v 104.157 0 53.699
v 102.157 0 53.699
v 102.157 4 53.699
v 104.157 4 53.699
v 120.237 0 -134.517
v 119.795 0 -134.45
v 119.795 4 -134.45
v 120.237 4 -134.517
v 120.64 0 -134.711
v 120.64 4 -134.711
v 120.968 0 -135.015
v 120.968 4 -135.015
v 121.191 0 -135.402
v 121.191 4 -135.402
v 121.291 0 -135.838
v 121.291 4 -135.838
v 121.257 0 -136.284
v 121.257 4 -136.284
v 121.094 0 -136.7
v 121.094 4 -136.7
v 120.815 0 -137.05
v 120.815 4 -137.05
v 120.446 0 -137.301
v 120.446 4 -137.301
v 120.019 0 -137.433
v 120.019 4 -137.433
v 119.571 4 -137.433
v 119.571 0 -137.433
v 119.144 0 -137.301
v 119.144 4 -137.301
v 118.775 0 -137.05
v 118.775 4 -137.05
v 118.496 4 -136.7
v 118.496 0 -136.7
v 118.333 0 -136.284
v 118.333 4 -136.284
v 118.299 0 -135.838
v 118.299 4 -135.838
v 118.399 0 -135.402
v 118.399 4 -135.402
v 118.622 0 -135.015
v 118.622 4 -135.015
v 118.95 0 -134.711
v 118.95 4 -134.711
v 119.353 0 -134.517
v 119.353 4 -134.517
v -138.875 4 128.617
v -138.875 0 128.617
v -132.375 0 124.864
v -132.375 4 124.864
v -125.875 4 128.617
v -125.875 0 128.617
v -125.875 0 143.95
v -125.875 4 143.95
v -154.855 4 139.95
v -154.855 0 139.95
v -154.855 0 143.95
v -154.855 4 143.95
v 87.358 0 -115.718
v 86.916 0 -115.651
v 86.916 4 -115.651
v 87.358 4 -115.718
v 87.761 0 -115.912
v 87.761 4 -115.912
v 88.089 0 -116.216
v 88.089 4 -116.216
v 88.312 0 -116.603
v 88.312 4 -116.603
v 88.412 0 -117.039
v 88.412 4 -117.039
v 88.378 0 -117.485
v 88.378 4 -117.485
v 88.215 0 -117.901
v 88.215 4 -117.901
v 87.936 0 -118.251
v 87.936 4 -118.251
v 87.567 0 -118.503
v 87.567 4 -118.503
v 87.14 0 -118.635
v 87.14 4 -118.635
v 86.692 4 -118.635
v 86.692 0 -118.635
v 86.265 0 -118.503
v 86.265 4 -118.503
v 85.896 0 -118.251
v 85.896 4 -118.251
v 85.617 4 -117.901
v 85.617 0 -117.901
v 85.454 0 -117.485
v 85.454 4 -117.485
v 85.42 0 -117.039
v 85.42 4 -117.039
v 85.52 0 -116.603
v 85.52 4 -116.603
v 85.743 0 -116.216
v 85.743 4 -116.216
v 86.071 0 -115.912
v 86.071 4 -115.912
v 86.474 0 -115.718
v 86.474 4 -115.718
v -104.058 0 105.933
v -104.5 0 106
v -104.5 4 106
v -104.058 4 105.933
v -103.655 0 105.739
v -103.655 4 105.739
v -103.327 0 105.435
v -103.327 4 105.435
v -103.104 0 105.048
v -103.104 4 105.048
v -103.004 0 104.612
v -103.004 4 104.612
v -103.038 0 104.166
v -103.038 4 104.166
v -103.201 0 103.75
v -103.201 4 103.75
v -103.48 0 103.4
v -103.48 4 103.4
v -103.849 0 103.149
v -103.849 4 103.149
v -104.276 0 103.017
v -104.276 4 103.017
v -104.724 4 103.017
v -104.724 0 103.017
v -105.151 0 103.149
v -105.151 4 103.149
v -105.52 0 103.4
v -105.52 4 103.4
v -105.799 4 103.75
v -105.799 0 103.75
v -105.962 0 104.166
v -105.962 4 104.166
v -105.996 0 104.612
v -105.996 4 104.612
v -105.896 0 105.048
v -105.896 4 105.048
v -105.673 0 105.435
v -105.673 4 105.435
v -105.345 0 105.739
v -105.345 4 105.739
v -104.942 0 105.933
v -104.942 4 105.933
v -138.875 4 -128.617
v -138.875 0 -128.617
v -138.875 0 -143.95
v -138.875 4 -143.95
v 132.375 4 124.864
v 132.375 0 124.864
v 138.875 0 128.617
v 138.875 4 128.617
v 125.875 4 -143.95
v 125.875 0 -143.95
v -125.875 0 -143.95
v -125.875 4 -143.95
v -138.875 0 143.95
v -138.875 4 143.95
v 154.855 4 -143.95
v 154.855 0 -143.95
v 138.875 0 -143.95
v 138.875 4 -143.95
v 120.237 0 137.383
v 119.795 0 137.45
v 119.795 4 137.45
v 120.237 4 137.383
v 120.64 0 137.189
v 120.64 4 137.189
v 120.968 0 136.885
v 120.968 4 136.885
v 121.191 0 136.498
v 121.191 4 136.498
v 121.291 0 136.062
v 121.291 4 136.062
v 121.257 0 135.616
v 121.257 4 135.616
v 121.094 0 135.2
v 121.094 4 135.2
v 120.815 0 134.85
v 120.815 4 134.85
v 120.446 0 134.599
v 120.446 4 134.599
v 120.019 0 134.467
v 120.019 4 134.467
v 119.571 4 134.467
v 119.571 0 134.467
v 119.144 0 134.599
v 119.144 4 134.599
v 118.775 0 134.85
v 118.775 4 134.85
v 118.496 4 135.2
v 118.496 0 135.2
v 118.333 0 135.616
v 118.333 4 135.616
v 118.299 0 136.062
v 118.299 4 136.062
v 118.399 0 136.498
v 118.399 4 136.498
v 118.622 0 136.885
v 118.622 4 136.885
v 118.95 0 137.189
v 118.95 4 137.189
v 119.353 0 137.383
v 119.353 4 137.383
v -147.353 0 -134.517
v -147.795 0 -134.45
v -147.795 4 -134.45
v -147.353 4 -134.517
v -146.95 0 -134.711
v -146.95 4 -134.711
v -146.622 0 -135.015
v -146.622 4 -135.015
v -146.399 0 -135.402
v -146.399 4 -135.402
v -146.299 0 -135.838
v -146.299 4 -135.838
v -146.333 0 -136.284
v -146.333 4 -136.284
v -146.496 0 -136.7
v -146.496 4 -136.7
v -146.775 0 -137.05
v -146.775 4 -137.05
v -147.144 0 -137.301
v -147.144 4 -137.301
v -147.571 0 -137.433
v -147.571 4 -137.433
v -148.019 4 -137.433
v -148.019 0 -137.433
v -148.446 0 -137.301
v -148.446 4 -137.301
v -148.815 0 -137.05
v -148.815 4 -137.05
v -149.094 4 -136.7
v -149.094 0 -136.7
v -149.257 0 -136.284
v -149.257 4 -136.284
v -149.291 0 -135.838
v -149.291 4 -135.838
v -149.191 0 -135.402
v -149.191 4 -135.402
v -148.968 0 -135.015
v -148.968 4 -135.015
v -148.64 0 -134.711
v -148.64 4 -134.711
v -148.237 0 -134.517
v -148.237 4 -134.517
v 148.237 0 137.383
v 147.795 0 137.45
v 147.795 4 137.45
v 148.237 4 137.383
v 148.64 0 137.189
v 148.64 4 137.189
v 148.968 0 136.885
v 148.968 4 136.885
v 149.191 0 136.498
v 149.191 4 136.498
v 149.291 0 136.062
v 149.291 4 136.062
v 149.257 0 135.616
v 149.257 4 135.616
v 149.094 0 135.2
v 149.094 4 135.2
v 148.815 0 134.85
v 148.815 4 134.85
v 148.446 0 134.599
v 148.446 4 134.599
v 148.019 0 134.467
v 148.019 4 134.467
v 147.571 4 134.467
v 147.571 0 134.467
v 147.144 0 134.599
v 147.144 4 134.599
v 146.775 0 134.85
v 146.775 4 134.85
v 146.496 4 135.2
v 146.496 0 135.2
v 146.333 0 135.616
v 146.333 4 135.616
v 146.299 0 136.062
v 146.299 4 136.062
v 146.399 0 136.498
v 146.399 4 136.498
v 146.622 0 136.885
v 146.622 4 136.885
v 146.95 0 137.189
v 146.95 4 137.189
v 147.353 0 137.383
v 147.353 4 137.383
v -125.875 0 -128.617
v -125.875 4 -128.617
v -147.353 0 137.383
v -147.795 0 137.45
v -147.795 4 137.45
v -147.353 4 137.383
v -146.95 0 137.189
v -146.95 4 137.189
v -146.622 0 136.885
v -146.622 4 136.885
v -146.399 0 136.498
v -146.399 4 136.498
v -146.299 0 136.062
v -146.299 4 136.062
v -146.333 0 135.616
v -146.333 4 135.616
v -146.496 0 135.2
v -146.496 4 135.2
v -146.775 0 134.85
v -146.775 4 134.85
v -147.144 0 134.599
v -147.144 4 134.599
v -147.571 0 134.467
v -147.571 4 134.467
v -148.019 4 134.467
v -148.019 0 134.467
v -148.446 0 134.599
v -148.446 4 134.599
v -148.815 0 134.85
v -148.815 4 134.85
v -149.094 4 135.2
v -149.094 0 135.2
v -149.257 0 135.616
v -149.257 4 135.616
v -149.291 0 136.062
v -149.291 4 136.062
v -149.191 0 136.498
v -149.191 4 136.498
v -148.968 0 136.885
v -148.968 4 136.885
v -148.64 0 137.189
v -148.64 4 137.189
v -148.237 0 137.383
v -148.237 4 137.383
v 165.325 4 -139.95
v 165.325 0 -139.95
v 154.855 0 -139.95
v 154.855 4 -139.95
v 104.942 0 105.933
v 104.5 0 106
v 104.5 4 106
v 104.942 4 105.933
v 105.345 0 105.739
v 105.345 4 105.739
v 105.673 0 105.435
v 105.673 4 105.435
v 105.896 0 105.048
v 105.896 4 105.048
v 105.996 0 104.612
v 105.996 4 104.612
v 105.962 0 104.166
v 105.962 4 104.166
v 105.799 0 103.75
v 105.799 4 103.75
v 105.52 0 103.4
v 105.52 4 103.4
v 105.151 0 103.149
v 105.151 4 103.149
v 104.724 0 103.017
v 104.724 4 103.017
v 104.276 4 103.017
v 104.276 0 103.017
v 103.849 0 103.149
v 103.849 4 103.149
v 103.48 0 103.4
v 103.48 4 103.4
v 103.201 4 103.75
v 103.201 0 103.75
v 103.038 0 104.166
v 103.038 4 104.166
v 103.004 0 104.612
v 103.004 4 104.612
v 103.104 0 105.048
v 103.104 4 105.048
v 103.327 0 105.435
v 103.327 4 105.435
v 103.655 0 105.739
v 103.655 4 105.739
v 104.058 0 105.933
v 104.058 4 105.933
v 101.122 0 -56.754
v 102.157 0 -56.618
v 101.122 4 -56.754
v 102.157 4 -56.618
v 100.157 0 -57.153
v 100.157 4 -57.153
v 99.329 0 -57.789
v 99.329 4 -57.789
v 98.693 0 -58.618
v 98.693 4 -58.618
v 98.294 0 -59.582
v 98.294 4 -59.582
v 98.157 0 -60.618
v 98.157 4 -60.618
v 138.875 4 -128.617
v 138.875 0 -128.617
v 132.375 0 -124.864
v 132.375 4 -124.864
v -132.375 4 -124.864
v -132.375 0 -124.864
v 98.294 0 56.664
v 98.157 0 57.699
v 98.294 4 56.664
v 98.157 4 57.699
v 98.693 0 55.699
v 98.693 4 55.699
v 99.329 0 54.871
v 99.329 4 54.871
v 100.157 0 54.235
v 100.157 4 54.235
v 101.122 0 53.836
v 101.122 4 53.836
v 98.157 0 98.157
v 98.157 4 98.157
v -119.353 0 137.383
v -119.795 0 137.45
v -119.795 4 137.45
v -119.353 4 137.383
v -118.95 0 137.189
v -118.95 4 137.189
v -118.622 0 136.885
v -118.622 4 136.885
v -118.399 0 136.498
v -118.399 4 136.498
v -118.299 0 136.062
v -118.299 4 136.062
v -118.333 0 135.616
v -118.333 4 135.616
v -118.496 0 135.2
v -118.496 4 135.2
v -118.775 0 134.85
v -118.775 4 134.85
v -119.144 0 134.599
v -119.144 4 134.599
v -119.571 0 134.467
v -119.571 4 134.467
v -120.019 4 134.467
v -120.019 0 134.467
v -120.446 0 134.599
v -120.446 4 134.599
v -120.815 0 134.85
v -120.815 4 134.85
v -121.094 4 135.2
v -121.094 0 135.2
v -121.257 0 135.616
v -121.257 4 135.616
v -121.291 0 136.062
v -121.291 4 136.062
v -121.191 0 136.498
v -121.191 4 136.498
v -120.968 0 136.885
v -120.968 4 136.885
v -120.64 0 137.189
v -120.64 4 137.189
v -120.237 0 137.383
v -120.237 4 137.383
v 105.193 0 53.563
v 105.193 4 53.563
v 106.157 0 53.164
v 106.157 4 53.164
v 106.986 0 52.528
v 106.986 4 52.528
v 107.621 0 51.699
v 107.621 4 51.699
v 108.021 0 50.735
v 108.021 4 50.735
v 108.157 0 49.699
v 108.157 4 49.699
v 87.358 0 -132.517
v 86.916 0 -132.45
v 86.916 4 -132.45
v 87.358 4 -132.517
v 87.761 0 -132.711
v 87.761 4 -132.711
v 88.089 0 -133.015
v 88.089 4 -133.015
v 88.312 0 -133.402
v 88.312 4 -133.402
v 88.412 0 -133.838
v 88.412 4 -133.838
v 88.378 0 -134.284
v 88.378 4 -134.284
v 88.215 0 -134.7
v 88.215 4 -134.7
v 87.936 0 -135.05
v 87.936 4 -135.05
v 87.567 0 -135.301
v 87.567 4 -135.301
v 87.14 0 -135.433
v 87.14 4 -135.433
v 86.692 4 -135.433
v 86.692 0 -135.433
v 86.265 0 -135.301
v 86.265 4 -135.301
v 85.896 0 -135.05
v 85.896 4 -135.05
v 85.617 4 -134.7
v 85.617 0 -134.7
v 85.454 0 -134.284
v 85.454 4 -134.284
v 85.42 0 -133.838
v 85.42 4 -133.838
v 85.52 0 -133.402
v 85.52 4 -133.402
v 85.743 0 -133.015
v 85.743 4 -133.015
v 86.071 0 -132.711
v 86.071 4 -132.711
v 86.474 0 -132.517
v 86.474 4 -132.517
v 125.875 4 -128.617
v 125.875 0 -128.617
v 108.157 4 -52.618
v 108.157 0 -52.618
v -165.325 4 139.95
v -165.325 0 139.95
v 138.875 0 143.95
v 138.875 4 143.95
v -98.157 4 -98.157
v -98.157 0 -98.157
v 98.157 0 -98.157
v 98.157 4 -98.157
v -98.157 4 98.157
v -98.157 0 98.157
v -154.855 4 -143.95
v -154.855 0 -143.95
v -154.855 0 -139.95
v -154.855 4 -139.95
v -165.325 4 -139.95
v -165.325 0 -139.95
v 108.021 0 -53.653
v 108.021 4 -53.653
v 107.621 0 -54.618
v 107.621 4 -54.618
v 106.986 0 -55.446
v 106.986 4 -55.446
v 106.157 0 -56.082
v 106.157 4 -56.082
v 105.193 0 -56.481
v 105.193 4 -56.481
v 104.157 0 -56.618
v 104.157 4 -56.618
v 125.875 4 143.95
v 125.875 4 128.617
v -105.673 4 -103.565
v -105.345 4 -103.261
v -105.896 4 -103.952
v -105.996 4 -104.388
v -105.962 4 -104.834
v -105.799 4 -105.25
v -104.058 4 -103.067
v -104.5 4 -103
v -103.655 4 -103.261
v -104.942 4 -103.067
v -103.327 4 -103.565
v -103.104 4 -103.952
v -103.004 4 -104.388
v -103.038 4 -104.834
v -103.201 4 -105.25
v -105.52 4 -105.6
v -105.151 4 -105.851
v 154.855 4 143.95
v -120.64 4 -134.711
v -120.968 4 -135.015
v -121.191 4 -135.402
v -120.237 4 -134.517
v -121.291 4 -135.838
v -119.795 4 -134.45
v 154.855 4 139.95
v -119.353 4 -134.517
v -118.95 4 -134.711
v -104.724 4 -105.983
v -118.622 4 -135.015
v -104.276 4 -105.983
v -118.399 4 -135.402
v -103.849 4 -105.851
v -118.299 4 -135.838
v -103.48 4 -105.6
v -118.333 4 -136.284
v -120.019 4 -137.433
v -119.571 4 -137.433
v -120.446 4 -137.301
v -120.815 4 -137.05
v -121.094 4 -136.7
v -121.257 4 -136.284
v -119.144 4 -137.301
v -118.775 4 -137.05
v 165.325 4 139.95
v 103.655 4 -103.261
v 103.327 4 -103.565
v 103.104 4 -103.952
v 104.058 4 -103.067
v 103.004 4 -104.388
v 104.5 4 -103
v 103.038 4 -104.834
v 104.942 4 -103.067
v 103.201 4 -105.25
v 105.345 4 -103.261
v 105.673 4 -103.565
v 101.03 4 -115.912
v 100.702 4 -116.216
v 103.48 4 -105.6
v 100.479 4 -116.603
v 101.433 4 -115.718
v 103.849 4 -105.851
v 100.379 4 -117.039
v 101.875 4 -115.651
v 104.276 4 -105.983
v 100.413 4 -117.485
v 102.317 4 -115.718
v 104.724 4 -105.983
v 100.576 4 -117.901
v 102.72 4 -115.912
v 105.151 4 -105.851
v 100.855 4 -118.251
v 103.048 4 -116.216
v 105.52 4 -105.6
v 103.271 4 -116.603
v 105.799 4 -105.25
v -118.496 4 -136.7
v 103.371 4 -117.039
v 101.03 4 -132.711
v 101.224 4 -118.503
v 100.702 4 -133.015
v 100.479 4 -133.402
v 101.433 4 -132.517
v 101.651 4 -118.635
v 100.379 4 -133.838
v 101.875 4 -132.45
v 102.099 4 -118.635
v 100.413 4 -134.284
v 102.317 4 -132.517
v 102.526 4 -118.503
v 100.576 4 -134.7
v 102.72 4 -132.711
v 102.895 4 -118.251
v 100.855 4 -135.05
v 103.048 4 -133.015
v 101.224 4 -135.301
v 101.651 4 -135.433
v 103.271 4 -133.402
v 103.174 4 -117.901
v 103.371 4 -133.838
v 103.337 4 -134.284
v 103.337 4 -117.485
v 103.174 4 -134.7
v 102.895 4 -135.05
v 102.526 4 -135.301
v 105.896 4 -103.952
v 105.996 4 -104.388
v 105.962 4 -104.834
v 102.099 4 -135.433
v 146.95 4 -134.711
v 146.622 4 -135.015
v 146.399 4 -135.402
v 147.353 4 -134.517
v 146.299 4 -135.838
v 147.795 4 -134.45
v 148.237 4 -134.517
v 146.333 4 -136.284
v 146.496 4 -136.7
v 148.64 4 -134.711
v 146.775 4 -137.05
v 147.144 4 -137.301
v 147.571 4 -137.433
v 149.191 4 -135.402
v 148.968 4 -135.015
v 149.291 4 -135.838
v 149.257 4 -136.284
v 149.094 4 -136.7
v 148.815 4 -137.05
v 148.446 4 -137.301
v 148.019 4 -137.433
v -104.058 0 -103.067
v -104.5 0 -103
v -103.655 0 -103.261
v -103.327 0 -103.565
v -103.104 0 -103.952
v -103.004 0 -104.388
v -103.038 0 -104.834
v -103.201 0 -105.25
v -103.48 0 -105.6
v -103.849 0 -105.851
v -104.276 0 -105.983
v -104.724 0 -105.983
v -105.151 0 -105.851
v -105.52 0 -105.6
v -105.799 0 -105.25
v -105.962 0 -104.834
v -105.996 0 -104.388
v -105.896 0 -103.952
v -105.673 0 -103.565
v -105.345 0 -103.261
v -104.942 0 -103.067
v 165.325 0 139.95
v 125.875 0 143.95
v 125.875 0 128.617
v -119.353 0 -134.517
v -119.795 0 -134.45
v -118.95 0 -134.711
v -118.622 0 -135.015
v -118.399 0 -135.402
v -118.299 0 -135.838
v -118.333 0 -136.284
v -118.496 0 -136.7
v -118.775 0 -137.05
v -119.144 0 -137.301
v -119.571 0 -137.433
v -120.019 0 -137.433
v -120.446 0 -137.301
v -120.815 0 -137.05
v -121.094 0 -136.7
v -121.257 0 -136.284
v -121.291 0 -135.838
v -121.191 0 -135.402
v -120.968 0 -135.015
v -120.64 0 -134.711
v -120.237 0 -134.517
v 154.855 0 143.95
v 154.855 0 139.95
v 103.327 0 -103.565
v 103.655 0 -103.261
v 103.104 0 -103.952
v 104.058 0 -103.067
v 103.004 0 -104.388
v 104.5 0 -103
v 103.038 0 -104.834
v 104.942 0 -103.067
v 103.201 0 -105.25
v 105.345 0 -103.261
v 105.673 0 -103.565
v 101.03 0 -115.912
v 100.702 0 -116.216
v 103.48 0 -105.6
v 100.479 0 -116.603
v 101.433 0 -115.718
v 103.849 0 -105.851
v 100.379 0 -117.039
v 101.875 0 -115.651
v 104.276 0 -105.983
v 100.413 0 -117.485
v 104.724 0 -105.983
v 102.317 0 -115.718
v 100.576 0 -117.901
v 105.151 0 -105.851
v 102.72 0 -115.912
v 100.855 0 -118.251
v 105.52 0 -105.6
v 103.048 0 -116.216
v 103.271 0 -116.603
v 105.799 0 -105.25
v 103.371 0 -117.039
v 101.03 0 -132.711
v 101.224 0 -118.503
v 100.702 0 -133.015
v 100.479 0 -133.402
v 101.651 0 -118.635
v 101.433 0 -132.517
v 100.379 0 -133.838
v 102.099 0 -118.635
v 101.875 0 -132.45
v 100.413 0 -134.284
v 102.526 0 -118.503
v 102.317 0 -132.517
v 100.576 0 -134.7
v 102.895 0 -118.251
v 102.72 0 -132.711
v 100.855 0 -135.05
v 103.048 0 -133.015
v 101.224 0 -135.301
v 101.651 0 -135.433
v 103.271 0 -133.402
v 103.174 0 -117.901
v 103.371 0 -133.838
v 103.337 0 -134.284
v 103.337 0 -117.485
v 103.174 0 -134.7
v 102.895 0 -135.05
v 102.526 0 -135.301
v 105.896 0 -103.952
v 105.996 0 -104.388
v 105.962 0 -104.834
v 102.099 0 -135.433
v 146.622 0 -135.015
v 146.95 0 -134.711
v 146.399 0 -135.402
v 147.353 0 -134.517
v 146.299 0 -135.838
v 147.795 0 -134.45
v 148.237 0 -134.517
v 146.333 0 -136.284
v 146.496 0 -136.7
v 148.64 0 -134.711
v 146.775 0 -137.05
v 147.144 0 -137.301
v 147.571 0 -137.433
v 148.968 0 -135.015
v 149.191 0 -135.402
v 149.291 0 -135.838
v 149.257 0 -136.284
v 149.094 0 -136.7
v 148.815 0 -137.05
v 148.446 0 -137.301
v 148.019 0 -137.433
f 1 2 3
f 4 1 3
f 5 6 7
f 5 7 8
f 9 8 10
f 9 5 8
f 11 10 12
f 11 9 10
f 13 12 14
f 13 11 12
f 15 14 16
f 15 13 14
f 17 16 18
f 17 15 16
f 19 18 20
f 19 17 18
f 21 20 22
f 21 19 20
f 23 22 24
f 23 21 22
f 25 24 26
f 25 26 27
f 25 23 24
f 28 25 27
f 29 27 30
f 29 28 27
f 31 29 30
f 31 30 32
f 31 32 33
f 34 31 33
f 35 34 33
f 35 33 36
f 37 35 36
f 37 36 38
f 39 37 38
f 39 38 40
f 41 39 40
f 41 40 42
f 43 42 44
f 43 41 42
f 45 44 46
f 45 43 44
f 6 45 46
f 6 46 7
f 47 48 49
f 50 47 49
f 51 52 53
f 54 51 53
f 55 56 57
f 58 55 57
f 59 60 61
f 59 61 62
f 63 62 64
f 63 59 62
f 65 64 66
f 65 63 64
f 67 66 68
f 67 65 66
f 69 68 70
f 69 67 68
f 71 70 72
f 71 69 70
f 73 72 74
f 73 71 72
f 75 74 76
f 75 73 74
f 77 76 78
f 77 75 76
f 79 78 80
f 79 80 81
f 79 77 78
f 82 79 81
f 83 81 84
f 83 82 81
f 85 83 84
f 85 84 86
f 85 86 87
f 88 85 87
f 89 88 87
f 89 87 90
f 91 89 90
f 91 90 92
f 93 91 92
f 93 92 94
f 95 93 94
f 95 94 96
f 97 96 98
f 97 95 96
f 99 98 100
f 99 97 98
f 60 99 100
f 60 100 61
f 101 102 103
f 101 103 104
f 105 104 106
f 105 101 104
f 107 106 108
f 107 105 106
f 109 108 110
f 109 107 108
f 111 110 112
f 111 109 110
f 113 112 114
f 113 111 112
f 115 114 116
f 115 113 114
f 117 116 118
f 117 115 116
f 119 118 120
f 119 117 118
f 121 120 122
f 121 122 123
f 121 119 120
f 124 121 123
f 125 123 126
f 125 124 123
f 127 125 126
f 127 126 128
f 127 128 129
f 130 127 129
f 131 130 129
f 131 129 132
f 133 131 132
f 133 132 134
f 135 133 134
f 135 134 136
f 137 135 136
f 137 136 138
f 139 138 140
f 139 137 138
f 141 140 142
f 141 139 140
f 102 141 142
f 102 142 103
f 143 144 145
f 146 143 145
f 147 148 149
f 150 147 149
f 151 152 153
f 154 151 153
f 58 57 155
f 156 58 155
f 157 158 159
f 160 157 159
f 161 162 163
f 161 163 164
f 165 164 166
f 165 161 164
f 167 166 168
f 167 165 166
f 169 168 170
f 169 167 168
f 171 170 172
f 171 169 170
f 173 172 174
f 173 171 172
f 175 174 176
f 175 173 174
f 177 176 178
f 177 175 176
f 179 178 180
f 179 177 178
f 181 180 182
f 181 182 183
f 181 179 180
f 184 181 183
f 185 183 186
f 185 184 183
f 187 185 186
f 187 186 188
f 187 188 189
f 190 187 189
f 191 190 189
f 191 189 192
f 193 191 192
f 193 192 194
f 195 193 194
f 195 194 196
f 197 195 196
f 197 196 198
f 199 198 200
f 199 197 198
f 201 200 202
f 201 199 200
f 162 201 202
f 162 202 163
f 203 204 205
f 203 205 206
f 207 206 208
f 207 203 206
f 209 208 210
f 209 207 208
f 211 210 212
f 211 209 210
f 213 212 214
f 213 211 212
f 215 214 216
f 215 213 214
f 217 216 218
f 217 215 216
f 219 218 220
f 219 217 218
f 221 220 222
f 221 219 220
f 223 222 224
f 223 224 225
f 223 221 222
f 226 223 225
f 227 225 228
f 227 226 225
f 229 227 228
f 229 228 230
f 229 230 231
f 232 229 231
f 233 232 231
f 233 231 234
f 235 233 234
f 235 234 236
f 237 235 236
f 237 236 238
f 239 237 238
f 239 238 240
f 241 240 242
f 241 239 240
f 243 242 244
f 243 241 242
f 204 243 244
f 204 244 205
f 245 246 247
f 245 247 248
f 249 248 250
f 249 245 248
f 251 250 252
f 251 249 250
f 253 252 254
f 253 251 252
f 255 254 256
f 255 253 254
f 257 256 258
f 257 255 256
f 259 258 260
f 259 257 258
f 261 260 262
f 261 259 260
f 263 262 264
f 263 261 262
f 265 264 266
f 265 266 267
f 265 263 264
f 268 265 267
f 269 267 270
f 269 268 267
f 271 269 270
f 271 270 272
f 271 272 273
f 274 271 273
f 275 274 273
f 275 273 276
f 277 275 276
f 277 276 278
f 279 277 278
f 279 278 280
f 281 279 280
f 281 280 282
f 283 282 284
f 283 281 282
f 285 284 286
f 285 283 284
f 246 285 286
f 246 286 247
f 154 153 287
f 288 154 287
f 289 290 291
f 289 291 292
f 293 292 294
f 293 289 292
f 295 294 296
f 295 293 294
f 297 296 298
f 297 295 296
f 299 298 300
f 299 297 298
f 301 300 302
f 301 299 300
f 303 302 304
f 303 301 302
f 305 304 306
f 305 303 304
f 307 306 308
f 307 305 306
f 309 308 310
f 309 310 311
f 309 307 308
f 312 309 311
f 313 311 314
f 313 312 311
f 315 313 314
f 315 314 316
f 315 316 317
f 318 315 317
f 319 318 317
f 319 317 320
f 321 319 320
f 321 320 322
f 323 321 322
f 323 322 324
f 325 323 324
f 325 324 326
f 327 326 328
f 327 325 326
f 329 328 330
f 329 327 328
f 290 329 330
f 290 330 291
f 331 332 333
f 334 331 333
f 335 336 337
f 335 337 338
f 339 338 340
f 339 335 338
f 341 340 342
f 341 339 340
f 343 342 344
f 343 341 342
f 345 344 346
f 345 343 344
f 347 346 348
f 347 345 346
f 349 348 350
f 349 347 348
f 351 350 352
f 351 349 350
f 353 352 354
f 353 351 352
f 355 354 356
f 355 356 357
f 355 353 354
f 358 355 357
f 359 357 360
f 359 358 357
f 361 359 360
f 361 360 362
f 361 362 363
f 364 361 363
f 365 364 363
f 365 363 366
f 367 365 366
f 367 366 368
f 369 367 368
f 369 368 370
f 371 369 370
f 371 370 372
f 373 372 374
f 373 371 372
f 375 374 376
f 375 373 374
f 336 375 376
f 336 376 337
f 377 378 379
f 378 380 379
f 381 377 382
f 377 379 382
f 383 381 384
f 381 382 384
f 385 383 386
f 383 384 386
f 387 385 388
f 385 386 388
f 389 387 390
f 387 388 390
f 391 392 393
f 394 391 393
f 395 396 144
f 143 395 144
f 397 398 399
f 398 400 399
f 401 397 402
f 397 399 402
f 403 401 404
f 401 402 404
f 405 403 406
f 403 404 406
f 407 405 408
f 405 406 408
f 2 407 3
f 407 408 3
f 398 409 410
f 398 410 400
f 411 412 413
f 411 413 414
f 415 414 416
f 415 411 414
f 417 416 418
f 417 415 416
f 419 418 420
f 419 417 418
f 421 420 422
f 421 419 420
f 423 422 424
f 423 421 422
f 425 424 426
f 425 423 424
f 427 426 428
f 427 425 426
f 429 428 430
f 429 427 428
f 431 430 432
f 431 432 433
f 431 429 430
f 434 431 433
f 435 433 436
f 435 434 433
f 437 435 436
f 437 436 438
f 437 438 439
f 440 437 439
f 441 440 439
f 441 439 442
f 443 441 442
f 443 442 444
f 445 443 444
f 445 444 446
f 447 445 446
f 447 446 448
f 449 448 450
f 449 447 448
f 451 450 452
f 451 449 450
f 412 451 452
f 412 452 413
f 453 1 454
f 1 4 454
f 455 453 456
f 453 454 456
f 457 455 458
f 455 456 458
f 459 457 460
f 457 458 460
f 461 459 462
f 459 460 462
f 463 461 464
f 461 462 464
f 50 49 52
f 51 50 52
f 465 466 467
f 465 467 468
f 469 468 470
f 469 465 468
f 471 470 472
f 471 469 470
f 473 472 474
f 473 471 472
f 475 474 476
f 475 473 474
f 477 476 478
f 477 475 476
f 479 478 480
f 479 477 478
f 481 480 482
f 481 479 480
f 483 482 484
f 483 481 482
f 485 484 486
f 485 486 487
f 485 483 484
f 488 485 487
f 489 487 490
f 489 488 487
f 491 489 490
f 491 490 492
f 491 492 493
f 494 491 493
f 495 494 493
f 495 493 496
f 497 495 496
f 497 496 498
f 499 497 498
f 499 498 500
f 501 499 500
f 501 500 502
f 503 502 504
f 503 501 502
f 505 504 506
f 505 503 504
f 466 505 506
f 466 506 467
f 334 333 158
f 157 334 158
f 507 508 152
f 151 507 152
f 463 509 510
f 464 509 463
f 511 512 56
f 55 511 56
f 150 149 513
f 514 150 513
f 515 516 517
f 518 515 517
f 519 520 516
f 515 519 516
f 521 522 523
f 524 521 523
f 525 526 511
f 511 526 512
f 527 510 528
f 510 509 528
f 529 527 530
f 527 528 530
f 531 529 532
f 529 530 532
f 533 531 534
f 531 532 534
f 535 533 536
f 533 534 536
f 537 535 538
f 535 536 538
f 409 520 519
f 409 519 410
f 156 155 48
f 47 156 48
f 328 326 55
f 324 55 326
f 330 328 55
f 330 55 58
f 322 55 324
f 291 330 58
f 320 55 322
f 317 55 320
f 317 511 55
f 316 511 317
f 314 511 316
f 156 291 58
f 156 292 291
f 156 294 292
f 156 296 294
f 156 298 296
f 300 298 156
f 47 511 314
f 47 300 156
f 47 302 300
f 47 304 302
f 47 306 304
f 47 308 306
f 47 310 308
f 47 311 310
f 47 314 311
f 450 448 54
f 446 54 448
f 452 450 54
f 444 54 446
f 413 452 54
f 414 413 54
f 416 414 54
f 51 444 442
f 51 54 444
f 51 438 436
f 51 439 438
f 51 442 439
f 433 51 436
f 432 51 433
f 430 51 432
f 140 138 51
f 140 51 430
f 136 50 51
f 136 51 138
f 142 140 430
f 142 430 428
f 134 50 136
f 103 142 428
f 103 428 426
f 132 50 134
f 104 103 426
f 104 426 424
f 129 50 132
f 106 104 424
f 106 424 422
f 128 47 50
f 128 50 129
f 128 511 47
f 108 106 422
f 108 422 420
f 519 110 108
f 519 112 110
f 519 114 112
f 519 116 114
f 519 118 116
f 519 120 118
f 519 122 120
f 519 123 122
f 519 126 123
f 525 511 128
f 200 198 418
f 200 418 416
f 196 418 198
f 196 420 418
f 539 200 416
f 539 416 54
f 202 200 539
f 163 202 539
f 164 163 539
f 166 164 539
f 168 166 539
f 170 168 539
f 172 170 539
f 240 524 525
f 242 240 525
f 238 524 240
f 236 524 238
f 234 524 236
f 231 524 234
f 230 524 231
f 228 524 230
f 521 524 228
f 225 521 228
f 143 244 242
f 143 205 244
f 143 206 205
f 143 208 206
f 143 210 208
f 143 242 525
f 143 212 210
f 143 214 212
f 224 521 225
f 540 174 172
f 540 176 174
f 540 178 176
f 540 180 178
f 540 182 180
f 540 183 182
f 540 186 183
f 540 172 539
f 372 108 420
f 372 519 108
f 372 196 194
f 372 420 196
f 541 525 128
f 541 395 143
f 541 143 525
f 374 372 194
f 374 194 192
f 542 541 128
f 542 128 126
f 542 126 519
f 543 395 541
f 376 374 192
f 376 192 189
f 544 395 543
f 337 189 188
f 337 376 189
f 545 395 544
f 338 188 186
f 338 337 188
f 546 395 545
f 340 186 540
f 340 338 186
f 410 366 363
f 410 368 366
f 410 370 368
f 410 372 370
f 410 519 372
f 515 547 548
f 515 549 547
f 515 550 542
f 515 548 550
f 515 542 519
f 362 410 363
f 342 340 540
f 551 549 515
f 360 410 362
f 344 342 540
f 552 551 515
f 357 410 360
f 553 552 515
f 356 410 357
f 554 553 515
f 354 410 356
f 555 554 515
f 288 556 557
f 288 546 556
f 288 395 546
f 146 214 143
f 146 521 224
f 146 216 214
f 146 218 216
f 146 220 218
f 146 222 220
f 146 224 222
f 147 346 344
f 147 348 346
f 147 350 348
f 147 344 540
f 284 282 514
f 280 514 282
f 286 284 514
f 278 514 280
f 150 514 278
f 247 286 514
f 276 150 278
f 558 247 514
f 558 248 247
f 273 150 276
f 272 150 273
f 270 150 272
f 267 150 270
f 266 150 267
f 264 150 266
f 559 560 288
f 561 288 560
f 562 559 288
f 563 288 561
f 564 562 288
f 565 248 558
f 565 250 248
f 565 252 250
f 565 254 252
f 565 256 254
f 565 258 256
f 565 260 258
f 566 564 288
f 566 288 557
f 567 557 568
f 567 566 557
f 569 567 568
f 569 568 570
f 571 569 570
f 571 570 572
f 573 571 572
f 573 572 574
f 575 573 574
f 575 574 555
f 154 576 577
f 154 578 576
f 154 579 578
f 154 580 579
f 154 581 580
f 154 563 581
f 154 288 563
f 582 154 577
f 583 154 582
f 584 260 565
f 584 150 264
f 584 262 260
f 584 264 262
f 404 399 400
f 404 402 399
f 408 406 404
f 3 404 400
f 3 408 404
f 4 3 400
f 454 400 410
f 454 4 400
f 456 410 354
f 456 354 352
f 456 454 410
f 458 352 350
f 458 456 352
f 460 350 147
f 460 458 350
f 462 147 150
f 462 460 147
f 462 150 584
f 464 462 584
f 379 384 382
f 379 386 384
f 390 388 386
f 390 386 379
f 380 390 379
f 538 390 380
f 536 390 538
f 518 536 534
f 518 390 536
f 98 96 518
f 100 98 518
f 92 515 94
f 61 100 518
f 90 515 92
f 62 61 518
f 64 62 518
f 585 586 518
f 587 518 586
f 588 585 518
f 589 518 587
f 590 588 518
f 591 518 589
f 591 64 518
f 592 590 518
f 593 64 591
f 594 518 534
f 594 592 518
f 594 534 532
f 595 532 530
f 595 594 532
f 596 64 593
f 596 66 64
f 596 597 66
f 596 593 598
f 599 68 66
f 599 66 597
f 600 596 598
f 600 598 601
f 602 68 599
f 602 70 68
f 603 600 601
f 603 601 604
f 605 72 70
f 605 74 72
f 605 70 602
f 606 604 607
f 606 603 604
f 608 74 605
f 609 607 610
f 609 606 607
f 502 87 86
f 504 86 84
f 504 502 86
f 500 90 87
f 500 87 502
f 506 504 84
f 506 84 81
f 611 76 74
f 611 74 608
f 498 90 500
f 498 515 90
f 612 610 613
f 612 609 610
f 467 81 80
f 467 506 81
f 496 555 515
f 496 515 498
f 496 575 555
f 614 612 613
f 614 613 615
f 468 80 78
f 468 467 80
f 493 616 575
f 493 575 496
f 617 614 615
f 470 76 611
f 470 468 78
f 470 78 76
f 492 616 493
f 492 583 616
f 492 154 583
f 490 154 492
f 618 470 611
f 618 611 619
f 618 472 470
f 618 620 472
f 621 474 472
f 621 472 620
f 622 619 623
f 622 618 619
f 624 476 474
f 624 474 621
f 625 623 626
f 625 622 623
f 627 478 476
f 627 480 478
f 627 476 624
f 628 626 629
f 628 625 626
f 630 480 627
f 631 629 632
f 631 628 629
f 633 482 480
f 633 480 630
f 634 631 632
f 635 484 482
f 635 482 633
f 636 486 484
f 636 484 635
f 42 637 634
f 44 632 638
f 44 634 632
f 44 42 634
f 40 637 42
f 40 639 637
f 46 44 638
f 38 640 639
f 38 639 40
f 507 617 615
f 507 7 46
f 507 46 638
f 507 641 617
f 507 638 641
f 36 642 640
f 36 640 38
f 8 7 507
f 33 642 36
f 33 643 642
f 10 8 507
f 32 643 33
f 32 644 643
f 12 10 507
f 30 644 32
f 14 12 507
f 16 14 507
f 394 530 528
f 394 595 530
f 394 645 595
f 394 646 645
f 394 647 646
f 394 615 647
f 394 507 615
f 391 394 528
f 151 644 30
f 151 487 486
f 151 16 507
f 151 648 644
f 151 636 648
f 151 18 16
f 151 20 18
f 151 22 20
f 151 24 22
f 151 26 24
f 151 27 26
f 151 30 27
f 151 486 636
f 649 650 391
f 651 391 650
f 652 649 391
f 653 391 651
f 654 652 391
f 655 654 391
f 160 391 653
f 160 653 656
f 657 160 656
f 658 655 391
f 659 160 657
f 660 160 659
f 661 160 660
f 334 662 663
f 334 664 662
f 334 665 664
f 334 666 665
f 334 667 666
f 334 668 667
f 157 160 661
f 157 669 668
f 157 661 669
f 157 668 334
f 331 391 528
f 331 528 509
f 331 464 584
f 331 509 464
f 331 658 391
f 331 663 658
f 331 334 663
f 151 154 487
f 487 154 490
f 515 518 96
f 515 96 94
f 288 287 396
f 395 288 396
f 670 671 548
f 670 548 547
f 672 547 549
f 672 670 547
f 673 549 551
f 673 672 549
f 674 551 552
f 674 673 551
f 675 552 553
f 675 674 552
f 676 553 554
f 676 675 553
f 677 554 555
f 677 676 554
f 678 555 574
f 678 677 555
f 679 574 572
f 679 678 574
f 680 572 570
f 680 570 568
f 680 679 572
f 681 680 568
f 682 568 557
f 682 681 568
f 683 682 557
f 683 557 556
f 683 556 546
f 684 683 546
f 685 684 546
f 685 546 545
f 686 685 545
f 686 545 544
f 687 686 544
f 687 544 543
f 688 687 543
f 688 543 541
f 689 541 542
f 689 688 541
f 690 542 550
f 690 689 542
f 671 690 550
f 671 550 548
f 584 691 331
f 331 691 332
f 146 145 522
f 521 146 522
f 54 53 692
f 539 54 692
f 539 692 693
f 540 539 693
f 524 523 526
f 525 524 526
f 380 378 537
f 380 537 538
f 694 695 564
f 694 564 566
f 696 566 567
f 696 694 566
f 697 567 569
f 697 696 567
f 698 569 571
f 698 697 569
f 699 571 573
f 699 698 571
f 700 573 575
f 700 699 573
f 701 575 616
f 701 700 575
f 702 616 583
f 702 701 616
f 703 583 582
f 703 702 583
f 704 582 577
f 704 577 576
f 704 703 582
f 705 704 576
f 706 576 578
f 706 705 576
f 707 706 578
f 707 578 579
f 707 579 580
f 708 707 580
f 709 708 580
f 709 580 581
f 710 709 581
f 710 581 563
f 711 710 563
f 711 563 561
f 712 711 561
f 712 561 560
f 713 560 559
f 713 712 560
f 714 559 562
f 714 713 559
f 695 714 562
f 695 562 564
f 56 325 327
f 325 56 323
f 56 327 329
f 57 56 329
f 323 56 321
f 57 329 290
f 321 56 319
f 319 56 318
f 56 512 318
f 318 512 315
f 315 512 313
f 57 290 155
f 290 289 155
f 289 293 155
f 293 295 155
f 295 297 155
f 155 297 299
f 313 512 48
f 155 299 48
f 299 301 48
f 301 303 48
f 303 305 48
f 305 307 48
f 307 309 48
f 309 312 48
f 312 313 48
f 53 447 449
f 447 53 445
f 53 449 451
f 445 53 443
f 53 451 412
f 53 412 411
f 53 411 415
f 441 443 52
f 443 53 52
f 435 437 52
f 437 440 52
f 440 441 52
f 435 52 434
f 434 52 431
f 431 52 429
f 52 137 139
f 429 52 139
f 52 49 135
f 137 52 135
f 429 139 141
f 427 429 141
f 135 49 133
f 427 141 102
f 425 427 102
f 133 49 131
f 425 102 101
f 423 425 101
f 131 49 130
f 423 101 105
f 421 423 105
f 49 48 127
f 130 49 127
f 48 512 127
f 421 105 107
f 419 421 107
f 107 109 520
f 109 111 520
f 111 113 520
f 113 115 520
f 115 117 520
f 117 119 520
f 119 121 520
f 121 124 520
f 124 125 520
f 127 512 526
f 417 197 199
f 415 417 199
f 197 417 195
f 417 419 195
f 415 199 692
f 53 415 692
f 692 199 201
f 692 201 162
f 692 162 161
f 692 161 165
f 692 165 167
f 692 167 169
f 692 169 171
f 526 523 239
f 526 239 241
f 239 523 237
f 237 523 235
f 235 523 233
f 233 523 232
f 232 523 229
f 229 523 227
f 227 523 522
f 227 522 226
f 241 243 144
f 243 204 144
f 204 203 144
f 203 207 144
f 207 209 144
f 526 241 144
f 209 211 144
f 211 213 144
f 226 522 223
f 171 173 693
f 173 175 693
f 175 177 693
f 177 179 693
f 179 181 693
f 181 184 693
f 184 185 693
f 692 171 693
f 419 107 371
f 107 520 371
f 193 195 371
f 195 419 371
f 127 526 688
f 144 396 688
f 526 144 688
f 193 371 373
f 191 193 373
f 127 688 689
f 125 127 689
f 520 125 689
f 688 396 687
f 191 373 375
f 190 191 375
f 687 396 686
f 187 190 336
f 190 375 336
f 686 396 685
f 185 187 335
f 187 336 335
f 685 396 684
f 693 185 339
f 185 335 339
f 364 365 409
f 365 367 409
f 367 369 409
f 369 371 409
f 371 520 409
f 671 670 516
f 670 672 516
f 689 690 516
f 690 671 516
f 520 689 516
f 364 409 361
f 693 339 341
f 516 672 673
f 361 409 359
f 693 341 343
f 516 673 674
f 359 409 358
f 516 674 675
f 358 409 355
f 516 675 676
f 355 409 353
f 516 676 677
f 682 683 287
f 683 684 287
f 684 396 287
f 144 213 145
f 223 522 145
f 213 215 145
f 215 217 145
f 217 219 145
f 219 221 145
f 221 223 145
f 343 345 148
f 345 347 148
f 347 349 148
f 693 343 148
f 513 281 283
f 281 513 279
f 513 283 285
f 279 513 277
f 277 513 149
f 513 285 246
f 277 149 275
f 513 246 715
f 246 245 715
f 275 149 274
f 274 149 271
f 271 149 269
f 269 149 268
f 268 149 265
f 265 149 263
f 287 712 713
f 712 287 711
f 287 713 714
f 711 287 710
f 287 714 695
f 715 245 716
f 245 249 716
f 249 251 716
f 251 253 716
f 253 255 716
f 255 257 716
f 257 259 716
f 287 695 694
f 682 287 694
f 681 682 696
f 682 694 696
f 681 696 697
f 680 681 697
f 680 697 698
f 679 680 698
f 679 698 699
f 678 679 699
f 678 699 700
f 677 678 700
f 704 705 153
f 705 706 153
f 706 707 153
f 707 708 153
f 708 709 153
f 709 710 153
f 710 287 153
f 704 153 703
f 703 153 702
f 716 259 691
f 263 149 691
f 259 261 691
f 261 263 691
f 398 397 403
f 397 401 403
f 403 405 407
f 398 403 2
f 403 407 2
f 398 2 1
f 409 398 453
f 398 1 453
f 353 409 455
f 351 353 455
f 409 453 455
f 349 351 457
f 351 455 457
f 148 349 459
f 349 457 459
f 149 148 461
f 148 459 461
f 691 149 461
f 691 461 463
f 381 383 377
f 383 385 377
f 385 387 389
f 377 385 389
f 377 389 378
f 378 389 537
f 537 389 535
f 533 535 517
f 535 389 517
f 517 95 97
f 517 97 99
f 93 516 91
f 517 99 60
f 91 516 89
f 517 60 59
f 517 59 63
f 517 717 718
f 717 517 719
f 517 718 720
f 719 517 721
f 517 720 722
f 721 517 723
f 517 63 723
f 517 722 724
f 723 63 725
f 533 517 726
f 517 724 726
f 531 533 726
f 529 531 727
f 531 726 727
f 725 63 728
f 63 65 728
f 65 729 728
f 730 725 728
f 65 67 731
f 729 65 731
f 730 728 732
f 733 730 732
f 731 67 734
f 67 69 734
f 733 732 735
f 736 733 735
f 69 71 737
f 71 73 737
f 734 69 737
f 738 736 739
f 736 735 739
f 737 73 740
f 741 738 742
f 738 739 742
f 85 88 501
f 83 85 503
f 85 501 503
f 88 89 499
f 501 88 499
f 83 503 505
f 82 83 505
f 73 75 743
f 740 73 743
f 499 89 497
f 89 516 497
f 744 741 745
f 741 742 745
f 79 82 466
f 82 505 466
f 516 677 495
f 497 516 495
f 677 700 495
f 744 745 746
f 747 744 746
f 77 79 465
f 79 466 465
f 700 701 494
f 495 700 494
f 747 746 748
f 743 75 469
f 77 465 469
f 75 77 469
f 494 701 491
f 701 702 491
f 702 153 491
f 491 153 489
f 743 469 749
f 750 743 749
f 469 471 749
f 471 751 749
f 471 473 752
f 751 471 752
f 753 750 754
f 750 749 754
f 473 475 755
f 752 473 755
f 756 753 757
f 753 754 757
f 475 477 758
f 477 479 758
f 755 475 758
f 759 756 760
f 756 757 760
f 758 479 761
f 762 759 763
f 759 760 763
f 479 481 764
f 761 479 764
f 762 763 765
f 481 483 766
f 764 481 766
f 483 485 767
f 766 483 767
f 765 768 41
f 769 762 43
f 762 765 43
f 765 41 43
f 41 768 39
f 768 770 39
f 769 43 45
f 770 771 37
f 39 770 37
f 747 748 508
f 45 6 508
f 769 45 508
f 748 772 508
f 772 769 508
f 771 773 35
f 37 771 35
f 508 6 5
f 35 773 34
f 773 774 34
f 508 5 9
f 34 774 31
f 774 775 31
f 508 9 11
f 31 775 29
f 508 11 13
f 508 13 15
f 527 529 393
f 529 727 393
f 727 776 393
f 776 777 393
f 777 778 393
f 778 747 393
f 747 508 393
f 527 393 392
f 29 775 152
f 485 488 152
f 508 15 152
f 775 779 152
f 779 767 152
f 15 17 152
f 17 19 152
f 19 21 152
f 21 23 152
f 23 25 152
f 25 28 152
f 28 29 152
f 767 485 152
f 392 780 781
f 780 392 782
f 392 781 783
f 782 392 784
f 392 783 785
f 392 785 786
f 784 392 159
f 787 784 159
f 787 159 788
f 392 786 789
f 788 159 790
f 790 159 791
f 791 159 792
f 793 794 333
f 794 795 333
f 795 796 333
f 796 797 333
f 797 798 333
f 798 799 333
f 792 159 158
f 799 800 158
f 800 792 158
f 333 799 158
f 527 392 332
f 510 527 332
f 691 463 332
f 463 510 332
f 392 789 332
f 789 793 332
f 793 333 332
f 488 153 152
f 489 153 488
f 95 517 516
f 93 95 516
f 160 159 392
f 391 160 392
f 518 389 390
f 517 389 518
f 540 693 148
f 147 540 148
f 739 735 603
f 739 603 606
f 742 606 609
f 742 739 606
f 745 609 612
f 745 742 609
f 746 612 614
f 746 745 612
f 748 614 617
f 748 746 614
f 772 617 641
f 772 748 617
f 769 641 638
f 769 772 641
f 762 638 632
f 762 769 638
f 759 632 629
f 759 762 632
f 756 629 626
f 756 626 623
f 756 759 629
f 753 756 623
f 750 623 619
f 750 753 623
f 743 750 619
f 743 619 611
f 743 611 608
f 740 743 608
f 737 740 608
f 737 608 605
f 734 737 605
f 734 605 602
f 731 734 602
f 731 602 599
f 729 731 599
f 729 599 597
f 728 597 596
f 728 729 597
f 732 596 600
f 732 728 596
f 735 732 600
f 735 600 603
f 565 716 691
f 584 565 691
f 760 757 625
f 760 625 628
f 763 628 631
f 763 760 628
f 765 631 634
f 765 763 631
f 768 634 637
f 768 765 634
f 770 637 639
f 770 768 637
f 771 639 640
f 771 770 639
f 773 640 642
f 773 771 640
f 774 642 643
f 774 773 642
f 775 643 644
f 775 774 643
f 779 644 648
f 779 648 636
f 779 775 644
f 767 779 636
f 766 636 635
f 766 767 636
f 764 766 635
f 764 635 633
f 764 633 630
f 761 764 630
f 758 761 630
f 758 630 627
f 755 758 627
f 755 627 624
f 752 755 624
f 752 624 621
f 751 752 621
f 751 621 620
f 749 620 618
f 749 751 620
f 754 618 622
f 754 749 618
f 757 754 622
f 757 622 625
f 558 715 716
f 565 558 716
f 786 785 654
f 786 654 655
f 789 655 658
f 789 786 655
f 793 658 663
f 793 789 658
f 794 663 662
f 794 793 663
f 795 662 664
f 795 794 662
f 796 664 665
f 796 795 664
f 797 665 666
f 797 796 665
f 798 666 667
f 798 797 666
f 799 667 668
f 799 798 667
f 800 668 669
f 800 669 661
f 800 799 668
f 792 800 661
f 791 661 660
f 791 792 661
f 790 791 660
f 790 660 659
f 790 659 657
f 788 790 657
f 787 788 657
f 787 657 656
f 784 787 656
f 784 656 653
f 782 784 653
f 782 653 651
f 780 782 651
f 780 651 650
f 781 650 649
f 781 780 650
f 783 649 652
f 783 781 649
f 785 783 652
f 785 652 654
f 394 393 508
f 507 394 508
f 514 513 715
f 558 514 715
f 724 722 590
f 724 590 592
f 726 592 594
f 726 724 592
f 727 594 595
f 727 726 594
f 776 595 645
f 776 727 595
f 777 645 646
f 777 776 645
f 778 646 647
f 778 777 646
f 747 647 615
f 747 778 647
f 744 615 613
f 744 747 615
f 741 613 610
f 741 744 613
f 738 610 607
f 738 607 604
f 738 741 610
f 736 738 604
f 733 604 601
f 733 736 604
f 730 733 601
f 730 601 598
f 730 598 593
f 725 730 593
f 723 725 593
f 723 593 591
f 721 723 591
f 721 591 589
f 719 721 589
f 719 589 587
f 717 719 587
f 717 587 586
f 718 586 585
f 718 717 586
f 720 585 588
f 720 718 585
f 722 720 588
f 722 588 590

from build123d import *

# Parameters (mm, degrees)
SKETCH1_R           = 1.5
SKETCH1_W           = 196.314766664
SKETCH1_H           = 196.314766664
BOSS_EXTRUDE1_DEPTH = 4
SKETCH7_W           = 110.317049386
SKETCH7_H           = 4
CUT_EXTRUDE1_DEPTH  = 10
FILLET1_R           = 4


with BuildPart() as part:
    # Sketch1 → Boss-Extrude1 (new body)
    with BuildSketch(Plane(origin=(0, 0, 0), x_dir=(1, 0, 0), z_dir=(0, 1, 0))):
        Polygon((154.855, -139.95), (165.325, -139.95), (165.325, 139.95), (154.855, 139.95), (154.855, 143.95), (138.875, 143.95), (138.875, 128.61722325), (132.375, 124.864446501), (125.875, 128.61722325), (125.875, 143.95), (-125.875, 143.95), (-125.875, 128.61722325), (-132.375, 124.864446501), (-138.875, 128.61722325), (-138.875, 143.95), (-154.855, 143.95), (-154.855, 139.95), (-165.325, 139.95), (-165.325, -139.95), (-154.855, -139.95), (-154.855, -143.95), (-138.875, -143.95), (-138.875, -128.61722325), (-132.375, -124.864446501), (-125.875, -128.61722325), (-125.875, -143.95), (125.875, -143.95), (125.875, -128.61722325), (132.375, -124.864446501), (138.875, -128.61722325), (138.875, -143.95), (154.855, -143.95), align=None)
        with Locations((-147.795, -135.95)):
            Circle(SKETCH1_R, mode=Mode.SUBTRACT)
        with Locations((-119.795, -135.95)):
            Circle(SKETCH1_R, mode=Mode.SUBTRACT)
        with Locations((-104.5, -104.5)):
            Circle(SKETCH1_R, mode=Mode.SUBTRACT)
        with Locations((119.795, -135.95)):
            Circle(SKETCH1_R, mode=Mode.SUBTRACT)
        with Locations((147.795, -135.95)):
            Circle(SKETCH1_R, mode=Mode.SUBTRACT)
        with Locations((104.5, -104.5)):
            Circle(SKETCH1_R, mode=Mode.SUBTRACT)
        with Locations((-104.5, 104.5)):
            Circle(SKETCH1_R, mode=Mode.SUBTRACT)
        with Locations((-147.795, 135.95)):
            Circle(SKETCH1_R, mode=Mode.SUBTRACT)
        with Locations((-119.795, 135.95)):
            Circle(SKETCH1_R, mode=Mode.SUBTRACT)
        Rectangle(SKETCH1_W, SKETCH1_H, mode=Mode.SUBTRACT)
        with Locations((104.5, 104.5)):
            Circle(SKETCH1_R, mode=Mode.SUBTRACT)
        with Locations((86.915968312, 117.1513625)):
            Circle(SKETCH1_R, mode=Mode.SUBTRACT)
        with Locations((101.875, 117.1513625)):
            Circle(SKETCH1_R, mode=Mode.SUBTRACT)
        with Locations((86.915968312, 133.95)):
            Circle(SKETCH1_R, mode=Mode.SUBTRACT)
        with Locations((101.875, 133.95)):
            Circle(SKETCH1_R, mode=Mode.SUBTRACT)
        with Locations((119.795, 135.95)):
            Circle(SKETCH1_R, mode=Mode.SUBTRACT)
        with Locations((147.795, 135.95)):
            Circle(SKETCH1_R, mode=Mode.SUBTRACT)
    extrude(amount=BOSS_EXTRUDE1_DEPTH)

    # Sketch7 → Cut-Extrude1 (cut)
    with BuildSketch(Plane.ZY.offset(-98.157383332)):
        with Locations((-1.45907227, 2)):
            Rectangle(SKETCH7_W, SKETCH7_H)
    extrude(amount=-CUT_EXTRUDE1_DEPTH, mode=Mode.SUBTRACT)

    # Fillet1
    fillet1_edges = [part.edges().sort_by_distance(p)[0] for p in [
        (108.157383332, 2, -56.617596963),
        (98.157383332, 2, -56.617596963),
        (108.157383332, 2, 53.699452423),
        (98.157383332, 2, 53.699452423),
    ]]
    fillet(fillet1_edges, radius=FILLET1_R)


solid = part.part
